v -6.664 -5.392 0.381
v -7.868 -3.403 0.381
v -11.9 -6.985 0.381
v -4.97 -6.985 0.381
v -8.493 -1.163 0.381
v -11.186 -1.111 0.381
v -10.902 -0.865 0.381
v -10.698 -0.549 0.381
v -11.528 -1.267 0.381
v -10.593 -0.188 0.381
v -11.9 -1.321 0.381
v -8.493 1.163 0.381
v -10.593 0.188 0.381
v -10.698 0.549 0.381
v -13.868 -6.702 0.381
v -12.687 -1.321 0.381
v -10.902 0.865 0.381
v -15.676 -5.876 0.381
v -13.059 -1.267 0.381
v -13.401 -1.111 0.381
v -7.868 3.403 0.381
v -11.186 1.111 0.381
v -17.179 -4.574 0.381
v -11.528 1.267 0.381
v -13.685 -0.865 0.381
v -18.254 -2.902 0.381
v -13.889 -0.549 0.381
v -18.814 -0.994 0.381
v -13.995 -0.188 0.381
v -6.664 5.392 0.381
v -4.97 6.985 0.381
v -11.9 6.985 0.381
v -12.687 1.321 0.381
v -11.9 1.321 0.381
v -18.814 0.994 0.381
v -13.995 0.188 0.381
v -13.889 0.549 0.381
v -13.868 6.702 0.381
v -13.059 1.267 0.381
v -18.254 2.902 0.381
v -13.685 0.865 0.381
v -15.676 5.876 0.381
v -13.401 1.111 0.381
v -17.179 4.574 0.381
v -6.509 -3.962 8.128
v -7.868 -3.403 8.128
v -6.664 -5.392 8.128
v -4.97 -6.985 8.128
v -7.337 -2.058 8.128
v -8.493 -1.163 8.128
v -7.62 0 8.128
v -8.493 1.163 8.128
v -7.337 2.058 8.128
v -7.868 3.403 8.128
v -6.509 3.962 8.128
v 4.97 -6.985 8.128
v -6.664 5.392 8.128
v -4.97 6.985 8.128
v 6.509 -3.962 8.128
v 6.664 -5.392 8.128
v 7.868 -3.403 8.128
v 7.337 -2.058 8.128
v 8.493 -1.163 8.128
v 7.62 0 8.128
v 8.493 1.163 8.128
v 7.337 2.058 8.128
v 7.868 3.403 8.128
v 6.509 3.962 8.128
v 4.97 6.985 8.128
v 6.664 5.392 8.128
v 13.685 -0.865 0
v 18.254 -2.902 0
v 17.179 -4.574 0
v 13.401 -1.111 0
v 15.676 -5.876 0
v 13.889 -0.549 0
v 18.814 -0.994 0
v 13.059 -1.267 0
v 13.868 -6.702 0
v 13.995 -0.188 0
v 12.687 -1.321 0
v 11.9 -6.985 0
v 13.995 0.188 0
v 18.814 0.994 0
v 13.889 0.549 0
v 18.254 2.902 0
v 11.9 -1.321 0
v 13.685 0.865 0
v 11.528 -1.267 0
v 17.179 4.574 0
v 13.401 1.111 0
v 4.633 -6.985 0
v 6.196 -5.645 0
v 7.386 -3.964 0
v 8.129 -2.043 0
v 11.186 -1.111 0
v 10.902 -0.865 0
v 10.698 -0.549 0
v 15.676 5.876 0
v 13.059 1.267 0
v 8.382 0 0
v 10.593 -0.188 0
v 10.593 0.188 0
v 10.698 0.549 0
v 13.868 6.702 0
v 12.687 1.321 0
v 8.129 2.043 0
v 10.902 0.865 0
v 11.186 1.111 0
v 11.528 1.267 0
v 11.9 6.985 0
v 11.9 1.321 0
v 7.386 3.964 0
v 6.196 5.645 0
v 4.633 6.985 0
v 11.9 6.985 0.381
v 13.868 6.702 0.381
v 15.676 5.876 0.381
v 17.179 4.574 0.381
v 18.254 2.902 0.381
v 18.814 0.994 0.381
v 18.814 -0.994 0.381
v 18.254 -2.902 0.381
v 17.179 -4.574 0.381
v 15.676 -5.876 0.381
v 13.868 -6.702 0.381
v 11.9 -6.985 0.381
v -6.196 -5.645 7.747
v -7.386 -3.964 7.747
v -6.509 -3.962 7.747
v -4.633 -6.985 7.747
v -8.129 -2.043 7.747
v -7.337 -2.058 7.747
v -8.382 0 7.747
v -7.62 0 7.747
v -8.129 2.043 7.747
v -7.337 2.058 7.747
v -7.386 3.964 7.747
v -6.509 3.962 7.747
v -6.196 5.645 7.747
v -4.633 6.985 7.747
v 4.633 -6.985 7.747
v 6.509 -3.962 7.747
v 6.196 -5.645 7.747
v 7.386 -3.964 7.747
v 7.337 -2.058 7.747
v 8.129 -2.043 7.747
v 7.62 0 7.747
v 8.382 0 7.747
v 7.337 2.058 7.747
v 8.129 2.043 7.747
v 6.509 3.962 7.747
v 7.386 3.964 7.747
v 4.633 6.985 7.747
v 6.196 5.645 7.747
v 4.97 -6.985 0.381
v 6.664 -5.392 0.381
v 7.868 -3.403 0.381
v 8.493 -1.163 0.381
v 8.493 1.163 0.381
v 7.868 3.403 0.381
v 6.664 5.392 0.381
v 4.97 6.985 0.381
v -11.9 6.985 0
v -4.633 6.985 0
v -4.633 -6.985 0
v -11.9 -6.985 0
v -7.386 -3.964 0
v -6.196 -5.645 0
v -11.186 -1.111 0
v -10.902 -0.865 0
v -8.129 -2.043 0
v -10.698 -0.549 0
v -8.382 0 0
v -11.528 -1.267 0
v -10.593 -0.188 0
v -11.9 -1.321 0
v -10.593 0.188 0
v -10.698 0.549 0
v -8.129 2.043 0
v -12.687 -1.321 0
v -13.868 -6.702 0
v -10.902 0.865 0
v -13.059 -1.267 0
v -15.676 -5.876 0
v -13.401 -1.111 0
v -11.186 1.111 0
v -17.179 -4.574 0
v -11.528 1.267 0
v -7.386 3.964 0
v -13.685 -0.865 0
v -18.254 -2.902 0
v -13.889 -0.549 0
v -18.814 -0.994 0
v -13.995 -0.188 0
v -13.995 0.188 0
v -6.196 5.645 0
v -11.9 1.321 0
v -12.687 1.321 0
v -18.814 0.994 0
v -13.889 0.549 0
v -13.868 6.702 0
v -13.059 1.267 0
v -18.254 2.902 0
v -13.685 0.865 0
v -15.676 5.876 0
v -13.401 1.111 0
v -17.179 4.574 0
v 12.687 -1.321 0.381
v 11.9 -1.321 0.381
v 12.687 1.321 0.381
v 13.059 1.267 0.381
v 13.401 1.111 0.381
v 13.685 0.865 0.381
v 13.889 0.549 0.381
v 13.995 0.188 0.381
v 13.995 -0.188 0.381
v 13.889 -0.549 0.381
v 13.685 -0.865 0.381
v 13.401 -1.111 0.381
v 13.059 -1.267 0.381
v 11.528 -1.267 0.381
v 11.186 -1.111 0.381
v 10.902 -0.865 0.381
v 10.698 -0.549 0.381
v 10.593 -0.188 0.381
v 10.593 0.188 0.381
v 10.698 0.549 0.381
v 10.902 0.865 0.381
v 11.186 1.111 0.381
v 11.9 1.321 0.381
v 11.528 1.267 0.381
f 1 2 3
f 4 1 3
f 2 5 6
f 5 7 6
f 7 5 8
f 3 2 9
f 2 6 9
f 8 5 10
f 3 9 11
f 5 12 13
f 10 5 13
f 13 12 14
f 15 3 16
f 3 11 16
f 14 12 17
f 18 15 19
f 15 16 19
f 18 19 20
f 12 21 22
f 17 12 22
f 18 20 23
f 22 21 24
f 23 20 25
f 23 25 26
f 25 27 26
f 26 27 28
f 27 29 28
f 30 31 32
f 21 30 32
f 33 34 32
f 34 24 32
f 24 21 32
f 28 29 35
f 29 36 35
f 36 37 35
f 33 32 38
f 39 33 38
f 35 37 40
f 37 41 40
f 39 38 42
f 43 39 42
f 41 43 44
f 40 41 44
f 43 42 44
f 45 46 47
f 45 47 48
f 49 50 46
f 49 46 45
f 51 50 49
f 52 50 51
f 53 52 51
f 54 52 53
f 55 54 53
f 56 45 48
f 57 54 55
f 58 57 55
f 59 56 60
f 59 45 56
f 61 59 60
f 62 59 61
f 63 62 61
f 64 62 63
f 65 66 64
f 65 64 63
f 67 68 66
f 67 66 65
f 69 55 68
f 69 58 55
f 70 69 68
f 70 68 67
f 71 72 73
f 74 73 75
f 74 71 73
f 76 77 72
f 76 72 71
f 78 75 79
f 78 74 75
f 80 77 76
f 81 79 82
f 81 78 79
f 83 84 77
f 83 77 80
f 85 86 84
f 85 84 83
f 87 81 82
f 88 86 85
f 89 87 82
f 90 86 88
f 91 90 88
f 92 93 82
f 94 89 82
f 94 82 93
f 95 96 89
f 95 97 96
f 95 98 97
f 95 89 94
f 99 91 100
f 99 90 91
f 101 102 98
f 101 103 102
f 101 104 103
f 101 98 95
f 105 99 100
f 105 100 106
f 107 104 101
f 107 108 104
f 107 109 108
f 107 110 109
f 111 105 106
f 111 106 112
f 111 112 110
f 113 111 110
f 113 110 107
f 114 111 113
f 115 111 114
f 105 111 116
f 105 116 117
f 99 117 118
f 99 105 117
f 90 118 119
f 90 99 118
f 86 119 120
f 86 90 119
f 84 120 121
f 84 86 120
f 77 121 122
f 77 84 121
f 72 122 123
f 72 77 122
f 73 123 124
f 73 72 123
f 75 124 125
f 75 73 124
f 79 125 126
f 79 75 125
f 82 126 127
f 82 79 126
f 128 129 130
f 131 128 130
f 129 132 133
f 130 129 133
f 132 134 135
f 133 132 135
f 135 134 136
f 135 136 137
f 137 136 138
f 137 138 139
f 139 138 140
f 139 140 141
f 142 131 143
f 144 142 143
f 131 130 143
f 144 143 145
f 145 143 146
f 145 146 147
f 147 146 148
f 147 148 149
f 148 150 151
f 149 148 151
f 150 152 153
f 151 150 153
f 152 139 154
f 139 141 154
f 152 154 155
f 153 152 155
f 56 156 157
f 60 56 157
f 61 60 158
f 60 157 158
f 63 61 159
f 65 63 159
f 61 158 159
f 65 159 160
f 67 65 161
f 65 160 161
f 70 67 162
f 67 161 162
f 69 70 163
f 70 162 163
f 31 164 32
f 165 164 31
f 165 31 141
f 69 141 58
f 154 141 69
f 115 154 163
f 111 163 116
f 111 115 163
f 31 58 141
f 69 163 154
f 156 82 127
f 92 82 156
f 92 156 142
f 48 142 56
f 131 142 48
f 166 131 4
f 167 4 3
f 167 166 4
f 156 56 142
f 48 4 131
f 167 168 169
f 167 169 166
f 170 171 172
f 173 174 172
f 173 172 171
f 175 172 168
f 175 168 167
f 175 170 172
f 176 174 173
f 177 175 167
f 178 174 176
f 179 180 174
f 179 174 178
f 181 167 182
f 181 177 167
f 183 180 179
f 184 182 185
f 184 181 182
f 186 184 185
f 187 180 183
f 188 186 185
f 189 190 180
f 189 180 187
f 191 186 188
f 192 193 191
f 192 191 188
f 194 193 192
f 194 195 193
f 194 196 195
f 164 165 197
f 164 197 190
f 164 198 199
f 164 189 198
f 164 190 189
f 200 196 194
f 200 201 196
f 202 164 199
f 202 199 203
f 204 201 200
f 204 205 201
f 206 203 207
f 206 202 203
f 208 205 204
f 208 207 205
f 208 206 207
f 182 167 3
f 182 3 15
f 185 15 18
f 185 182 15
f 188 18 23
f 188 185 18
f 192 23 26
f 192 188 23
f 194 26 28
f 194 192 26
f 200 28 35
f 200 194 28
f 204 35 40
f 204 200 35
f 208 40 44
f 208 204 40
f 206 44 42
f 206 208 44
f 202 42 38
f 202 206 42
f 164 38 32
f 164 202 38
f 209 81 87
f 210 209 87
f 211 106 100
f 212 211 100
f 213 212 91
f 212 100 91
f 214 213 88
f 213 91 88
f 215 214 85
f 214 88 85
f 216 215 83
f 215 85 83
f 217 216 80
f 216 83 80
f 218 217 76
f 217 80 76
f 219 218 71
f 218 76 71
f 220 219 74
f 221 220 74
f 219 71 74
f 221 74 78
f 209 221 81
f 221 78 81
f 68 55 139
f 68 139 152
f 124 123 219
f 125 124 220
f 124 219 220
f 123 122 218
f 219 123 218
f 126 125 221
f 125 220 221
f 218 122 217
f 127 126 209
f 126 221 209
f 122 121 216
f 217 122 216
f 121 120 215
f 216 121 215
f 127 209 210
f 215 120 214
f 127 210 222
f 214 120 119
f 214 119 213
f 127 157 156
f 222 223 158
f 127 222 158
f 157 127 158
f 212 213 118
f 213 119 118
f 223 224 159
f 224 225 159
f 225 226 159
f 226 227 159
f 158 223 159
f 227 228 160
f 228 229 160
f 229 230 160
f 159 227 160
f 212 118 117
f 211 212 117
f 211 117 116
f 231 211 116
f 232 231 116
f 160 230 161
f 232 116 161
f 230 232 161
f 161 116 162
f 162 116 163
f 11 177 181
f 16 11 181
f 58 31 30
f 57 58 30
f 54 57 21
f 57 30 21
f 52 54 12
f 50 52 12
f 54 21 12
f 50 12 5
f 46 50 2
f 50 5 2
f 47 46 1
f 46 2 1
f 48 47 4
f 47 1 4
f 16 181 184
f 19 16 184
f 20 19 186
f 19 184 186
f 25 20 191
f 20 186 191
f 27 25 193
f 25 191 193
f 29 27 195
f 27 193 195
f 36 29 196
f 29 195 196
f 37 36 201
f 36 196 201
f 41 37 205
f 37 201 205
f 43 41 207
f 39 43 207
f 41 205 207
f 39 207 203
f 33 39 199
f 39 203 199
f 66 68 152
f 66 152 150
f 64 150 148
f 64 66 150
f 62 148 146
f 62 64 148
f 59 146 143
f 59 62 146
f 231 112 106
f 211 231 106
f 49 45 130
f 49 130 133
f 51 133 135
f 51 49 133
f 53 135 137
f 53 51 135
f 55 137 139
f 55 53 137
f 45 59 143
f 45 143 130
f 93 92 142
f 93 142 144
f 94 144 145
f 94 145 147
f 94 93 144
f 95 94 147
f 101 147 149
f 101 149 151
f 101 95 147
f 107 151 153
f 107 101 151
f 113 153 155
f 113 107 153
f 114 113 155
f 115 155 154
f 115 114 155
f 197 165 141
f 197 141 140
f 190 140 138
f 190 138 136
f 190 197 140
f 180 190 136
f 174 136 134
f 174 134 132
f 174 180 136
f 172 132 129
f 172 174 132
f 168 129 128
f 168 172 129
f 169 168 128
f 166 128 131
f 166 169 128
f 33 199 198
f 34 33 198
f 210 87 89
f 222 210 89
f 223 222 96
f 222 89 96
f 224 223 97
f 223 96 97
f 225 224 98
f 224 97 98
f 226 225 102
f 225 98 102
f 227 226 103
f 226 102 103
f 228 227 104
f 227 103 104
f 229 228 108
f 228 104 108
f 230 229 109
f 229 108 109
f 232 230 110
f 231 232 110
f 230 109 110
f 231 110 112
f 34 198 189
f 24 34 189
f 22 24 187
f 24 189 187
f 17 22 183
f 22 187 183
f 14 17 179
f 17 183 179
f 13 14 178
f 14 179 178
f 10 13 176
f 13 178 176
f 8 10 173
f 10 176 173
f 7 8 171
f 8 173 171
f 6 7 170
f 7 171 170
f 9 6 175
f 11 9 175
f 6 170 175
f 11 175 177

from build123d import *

# Parameters (mm, degrees)
EXTRUDE1_DEPTH     = 0.381
EXTRUDE2_DEPTH     = 7.747
CUT_EXTRUDE1_DEPTH = 7.747
CUT_EXTRUDE2_DEPTH = 9.128


with BuildPart() as part:
    # Sketch1 → Extrude1 (new body)
    with BuildSketch(Plane.XY):
        with BuildLine():
            Line((-11.8999, 6.985), (11.8999, 6.985))
            ThreePointArc((11.8999, 6.985), (18.8849, 0), (11.8999, -6.985))
            Line((11.8999, -6.985), (-11.8999, -6.985))
            ThreePointArc((-11.8999, -6.985), (-18.8849, 0), (-11.8999, 6.985))
        make_face()
        with BuildLine():
            Line((11.8999, 1.3208), (12.6873, 1.3208))
            ThreePointArc((12.6873, 1.3208), (14.0081, 0), (12.6873, -1.3208))
            Line((12.6873, -1.3208), (11.8999, -1.3208))
            ThreePointArc((11.8999, -1.3208), (10.5791, 0), (11.8999, 1.3208))
        make_face(mode=Mode.SUBTRACT)
        with BuildLine():
            Line((-12.6873, 1.3208), (-11.8999, 1.3208))
            ThreePointArc((-11.8999, 1.3208), (-10.5791, 0), (-11.8999, -1.3208))
            Line((-11.8999, -1.3208), (-12.6873, -1.3208))
            ThreePointArc((-12.6873, -1.3208), (-14.0081, 0), (-12.6873, 1.3208))
        make_face(mode=Mode.SUBTRACT)
    extrude(amount=EXTRUDE1_DEPTH)

    # Sketch2 → Extrude2 (add)
    with BuildSketch(Plane.XY.offset(0.381)):
        with BuildLine():
            Line((-4.96966108, -6.985), (4.96966108, -6.985))
            ThreePointArc((4.96966108, -6.985), (8.5725, 0), (4.96966108, 6.985))
            Line((4.96966108, 6.985), (-4.96966108, 6.985))
            ThreePointArc((-4.96966108, 6.985), (-8.5725, 0), (-4.96966108, -6.985))
        make_face()
    extrude(amount=EXTRUDE2_DEPTH)

    # Sketch3 → Cut-Extrude1 (cut)
    with BuildSketch(Plane(origin=(0, 0, 0), x_dir=(-1, 0, 0), z_dir=(0, 0, -1))):
        with BuildLine():
            Line((-4.633324832, 6.985), (4.633324832, 6.985))
            ThreePointArc((4.633324832, 6.985), (8.382, 0), (4.633324832, -6.985))
            Line((4.633324832, -6.985), (-4.633324832, -6.985))
            ThreePointArc((-4.633324832, -6.985), (-8.382, 0), (-4.633324832, 6.985))
        make_face()
    extrude(amount=-CUT_EXTRUDE1_DEPTH, mode=Mode.SUBTRACT)

    # Sketch4 → Cut-Extrude2 (cut, through all)
    with BuildSketch(Plane.XY.offset(8.128)):
        with BuildLine():
            Line((-6.508746902, 3.9624), (6.508746902, 3.9624))
            ThreePointArc((6.508746902, 3.9624), (7.62, 0), (6.508746902, -3.9624))
            Line((6.508746902, -3.9624), (-6.508746902, -3.9624))
            ThreePointArc((-6.508746902, -3.9624), (-7.62, 0), (-6.508746902, 3.9624))
        make_face()
    extrude(amount=-CUT_EXTRUDE2_DEPTH, mode=Mode.SUBTRACT)


solid = part.part
